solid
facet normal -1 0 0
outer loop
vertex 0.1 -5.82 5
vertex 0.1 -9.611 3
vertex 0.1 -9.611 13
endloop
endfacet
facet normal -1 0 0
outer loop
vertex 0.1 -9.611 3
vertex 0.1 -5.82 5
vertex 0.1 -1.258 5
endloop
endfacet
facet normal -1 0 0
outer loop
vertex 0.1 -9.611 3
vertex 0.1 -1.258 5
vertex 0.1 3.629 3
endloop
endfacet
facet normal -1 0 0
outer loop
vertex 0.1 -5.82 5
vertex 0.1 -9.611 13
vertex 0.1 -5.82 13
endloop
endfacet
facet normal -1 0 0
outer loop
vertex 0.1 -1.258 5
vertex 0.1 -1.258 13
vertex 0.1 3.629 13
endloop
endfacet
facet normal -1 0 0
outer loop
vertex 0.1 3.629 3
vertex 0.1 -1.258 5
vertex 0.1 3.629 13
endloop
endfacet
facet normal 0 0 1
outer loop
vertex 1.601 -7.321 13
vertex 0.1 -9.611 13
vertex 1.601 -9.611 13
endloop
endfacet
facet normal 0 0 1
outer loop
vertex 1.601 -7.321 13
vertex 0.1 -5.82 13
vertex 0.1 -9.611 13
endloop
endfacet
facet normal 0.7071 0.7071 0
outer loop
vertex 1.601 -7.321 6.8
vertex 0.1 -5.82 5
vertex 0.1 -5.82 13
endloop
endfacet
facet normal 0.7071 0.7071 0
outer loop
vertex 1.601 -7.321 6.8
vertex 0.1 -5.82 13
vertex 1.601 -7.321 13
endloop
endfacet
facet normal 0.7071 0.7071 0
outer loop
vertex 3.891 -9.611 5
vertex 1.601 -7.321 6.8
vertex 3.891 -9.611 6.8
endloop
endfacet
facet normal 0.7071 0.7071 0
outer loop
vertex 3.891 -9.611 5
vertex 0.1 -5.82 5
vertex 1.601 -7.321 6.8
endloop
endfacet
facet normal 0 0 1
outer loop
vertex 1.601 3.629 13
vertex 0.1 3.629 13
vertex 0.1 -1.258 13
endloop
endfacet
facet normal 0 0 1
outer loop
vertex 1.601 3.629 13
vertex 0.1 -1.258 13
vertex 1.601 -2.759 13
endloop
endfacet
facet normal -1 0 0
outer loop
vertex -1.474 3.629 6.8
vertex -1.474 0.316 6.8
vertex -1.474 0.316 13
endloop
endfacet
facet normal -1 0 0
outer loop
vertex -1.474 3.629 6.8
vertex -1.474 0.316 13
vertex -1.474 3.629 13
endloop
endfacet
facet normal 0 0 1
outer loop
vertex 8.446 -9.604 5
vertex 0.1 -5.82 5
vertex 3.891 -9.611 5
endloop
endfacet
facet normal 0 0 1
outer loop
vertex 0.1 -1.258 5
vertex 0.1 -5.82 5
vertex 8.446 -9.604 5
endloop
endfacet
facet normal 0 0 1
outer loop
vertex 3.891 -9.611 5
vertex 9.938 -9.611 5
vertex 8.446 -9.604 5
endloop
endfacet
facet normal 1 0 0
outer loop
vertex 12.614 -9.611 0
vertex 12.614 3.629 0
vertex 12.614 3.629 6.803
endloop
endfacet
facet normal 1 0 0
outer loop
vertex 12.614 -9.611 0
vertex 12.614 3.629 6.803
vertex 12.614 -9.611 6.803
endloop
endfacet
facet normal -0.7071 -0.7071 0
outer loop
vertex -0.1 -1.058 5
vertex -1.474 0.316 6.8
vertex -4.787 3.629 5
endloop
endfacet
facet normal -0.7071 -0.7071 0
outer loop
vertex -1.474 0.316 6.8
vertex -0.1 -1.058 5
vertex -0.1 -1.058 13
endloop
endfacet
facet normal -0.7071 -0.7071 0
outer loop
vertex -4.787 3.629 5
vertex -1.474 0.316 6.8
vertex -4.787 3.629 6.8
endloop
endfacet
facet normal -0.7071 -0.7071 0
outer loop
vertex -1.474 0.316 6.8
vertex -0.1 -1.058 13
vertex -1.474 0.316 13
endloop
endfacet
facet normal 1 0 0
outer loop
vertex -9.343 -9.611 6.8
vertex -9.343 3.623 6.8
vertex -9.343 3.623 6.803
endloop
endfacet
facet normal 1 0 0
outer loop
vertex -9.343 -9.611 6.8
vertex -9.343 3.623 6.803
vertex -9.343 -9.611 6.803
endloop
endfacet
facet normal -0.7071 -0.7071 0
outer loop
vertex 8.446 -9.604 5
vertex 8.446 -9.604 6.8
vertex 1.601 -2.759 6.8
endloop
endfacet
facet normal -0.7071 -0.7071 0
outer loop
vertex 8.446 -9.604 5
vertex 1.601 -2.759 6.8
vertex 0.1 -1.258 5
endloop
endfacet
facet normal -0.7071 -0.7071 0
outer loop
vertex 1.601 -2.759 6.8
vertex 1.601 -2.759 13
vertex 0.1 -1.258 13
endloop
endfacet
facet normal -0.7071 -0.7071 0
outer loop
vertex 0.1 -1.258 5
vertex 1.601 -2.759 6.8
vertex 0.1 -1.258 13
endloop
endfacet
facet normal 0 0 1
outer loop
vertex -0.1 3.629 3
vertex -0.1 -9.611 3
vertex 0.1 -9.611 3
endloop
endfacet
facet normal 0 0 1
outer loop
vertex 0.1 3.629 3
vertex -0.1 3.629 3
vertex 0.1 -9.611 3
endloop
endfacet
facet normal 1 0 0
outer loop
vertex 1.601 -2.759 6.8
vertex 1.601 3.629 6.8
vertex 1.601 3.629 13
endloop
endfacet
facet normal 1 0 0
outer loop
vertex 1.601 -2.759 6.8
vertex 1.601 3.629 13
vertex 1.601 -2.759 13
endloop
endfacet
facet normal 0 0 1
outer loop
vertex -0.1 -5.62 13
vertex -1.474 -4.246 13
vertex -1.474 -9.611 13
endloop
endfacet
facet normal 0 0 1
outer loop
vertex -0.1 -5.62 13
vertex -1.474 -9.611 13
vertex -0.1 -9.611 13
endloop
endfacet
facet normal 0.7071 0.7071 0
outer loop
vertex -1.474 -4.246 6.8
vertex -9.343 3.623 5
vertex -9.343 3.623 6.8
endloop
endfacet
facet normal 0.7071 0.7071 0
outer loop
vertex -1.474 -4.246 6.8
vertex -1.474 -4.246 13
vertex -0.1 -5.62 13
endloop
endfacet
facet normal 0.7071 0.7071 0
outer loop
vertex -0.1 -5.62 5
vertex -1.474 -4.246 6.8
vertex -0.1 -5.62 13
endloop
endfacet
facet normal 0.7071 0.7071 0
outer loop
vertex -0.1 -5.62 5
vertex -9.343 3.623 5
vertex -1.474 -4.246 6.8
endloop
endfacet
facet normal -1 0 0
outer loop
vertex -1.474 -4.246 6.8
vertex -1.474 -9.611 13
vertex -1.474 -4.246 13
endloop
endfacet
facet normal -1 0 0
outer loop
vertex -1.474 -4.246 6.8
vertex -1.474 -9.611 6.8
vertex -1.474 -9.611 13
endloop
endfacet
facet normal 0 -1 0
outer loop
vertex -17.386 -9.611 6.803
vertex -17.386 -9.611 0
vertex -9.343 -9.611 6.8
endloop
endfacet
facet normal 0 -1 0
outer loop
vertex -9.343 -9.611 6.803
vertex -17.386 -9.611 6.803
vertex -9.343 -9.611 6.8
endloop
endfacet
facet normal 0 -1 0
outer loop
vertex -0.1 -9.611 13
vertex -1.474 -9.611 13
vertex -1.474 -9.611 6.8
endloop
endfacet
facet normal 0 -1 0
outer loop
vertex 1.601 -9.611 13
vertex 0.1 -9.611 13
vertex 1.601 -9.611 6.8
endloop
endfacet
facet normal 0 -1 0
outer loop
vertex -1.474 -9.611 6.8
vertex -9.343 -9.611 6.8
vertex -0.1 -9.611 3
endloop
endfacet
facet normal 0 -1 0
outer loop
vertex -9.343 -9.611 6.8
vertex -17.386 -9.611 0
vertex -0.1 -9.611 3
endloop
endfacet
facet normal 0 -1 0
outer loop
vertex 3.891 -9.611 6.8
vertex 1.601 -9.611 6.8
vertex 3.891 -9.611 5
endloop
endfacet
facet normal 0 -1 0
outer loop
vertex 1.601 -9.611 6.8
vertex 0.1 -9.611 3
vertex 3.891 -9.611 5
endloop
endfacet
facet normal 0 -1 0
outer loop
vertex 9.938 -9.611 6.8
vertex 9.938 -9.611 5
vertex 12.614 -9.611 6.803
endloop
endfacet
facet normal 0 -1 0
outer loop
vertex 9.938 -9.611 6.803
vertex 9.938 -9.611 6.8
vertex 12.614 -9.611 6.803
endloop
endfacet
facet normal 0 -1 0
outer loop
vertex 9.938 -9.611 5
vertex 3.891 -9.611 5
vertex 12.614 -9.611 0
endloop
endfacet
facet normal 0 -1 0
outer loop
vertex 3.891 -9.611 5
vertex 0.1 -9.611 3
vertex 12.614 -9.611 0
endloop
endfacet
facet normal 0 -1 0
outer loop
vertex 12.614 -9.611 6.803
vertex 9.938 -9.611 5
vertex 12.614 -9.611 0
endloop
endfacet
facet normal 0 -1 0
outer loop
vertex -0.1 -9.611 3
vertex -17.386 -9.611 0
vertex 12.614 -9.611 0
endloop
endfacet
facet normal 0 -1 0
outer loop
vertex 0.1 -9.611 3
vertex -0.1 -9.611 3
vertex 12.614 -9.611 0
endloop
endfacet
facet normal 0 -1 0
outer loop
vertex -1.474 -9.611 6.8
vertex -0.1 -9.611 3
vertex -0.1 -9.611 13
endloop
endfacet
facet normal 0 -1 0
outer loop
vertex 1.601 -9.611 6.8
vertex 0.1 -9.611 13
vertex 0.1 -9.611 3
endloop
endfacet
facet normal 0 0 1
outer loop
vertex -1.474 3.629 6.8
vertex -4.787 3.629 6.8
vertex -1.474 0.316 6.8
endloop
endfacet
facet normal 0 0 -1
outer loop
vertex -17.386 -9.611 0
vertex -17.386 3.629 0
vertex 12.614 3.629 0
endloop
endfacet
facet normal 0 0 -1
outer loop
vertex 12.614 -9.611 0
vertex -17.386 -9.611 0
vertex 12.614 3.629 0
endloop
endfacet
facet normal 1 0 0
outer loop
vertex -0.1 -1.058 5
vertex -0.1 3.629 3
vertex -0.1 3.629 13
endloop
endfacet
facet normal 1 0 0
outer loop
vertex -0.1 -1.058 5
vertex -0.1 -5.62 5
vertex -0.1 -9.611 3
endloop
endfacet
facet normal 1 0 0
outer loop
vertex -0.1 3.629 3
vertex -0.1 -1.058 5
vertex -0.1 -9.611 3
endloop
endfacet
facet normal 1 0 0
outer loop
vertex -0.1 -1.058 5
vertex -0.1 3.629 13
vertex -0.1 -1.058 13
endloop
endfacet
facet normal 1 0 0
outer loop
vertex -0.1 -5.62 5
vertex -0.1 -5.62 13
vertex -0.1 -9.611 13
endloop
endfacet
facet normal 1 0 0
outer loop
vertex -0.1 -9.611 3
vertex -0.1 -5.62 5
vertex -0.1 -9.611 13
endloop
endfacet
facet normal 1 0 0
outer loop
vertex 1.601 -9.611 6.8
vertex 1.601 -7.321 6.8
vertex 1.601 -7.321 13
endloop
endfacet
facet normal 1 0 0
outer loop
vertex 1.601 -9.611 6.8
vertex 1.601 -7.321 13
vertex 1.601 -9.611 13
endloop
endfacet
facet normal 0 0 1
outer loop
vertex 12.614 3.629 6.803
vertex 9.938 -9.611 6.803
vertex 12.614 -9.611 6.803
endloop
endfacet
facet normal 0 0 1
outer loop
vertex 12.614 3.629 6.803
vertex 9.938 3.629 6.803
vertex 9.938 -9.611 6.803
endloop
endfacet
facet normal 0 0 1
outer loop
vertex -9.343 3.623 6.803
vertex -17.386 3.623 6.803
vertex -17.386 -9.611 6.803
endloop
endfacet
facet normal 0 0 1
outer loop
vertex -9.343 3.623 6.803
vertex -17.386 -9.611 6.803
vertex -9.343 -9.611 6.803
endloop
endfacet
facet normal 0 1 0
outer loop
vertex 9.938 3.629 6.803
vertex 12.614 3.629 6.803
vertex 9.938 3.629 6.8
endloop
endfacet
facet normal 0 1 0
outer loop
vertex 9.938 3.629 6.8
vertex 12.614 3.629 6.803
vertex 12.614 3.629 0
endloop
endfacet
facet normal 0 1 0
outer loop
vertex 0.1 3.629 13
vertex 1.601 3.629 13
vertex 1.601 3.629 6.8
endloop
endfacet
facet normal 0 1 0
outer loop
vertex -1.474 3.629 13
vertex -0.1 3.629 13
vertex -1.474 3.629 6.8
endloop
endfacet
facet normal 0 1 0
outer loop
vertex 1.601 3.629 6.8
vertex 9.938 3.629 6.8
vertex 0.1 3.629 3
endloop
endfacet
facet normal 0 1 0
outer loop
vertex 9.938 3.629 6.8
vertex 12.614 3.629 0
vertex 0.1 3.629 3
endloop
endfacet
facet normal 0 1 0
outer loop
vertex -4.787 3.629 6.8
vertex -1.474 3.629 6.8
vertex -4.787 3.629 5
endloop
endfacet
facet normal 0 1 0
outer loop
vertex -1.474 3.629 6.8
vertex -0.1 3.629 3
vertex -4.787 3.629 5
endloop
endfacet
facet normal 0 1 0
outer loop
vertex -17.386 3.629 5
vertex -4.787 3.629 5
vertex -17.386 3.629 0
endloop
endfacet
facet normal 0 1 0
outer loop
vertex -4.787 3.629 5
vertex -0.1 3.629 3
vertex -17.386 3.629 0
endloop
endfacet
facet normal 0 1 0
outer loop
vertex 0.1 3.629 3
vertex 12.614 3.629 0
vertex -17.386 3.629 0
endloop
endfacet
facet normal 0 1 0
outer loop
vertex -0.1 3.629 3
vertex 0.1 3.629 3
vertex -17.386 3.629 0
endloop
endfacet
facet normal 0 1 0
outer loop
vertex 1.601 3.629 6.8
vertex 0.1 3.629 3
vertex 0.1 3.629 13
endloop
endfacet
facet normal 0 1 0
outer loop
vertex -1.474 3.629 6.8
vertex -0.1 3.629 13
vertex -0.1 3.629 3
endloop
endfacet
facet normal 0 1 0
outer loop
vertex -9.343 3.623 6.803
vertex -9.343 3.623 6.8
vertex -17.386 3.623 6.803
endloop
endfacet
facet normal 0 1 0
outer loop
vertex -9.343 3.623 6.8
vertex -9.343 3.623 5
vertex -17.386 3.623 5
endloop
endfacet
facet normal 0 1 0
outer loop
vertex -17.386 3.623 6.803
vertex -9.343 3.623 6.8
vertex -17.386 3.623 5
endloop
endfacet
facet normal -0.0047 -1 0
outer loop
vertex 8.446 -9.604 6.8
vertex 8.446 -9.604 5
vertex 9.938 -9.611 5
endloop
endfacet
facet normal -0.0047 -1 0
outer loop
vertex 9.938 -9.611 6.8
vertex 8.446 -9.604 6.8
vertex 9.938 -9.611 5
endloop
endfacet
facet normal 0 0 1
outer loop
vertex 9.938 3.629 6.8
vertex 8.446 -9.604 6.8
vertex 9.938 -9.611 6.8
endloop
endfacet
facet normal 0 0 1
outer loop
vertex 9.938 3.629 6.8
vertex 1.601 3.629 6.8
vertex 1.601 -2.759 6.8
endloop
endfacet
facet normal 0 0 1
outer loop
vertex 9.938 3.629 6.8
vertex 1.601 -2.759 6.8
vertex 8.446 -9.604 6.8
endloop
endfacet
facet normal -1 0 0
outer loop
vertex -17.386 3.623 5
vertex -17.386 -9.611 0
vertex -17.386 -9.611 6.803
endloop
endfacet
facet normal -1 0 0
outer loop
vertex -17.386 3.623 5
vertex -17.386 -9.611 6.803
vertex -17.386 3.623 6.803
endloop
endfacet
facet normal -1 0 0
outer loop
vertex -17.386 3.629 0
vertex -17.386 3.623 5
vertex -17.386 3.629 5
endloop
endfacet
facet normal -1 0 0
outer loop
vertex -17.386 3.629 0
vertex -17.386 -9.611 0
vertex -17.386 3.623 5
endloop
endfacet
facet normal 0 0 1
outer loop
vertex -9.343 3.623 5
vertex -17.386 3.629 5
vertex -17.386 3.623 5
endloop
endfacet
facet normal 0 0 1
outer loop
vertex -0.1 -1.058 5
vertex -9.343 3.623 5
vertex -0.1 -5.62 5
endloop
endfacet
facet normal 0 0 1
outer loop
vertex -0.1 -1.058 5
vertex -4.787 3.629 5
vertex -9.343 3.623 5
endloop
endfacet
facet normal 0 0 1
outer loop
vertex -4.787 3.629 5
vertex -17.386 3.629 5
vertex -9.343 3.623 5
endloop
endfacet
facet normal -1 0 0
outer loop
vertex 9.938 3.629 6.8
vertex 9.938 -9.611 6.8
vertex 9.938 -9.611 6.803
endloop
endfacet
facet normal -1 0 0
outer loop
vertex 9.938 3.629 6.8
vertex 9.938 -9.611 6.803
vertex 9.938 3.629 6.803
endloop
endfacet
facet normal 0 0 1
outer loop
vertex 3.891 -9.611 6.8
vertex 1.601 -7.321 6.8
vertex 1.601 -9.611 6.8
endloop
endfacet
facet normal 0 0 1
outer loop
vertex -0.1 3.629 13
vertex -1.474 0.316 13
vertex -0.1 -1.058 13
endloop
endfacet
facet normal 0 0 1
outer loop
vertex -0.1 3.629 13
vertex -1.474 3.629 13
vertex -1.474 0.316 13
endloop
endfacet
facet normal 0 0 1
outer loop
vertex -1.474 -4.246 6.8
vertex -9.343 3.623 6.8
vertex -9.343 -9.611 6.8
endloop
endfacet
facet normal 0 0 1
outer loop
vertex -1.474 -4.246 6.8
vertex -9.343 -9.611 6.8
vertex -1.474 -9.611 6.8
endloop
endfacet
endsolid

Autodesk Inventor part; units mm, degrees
ref_plane "YZ Plane" through (0, 0, 0) normal (1, 0, 0) x (0, 1, 0)
ref_plane "XZ Plane" through (0, 0, 0) normal (0, 1, 0) x (-1, 0, 0)
ref_plane "XY Plane" through (0, 0, 0) normal (0, 0, 1) x (1, 0, 0)
sketch "Sketch1" plane through (0, 0, 0) normal (0, 0, 1) x (1, 0, 0)
  line L0 (-17.386, 3.6293) -> (12.614, 3.6293)
  line L1 (12.614, 3.6293) -> (12.614, -9.6107)
  line L2 (12.614, -9.6107) -> (-17.386, -9.6107)
  line L3 (-17.386, -9.6107) -> (-17.386, 3.6293)
  point P0 (0, 0)
  dimension "d0" = 30
  dimension "d1" = 13.24
extrude "Extrusion1" add sketch "Sketch1" along normal blind 5
sketch "Sketch5" plane through (0, 0, 5) normal (0, 0, 1) x (1, 0, 0)
  line L0 (-9.3427, 3.6227) -> (3.8907, -9.6107)
  line L1 (-4.7873, 3.6293) -> (8.4461, -9.6041)
  line L2 (-4.7873, 3.6293) -> (13.9275, 3.6293) construction
  line L3 (-9.3427, 3.6227) -> (-9.3427, -9.6107)
  line L4 (-9.3427, -9.6107) -> (3.8907, -9.6107)
  line L5 (3.8907, -9.6107) -> (3.8907, -9.6107)
  line L6 (-4.7873, 3.6293) -> (9.938, 3.6293)
  line L7 (12.614, 3.6293) -> (-17.386, 3.6293) projected
  line L8 (9.938, 3.6293) -> (9.938, -9.6107)
  line L9 (-17.386, -9.6107) -> (12.614, -9.6107) projected
  line L10 (8.4461, -9.6041) -> (9.938, -9.6107)
  line L11 (-9.3427, 3.6227) -> (-9.3427, -9.6107)
  line L12 (3.8907, -9.6107) -> (-9.3427, -9.6107)
  line L13 (3.8907, -9.6107) -> (-9.3427, 3.6227)
  line L14 (-4.7873, 3.6293) -> (8.4461, -9.6041)
  line L15 (8.4461, -9.6041) -> (9.938, -9.6107)
  line L16 (9.938, 3.6293) -> (9.938, -9.6107)
  line L17 (9.938, 3.6293) -> (-4.7873, 3.6293)
  point P0 (0, 0)
  dimension "d15" = 45
  dimension "d16" = 3.2258
  dimension "d17" = 13.2334
  dimension "d18" = 18.7148
  dimension "d19" = 18.7148
extrude "Extrusion5" add sketch "Sketch5" along normal blind 1.8
sketch "Sketch6" plane through (0, 0, 6.8) normal (0, 0, 1) x (1, 0, 0)
  line L0 (9.938, 3.6293) -> (-4.7873, 3.6293) projected
  line L1 (12.614, -9.6107) -> (-17.386, -9.6107) projected
  line L2 (-1.4744, 3.6293) -> (1.6007, 3.6293)
  line L3 (1.6007, 3.6293) -> (1.6007, -9.6107)
  line L4 (1.6007, -9.6107) -> (-1.4744, -9.6107)
  line L5 (-1.4744, -9.6107) -> (-1.4744, 3.6293)
  point P0 (0, 0)
extrude "Extrusion6" add sketch "Sketch6" along normal blind 6.2
sketch "Sketch9" plane through (0, 0, 13) normal (0, 0, 1) x (1, 0, 0)
  line L0 (-1.4744, -4.2456) -> (-9.3427, 3.6227) projected
  line L1 (-9.3427, 3.6227) -> (3.8907, -9.6107) projected
  line L2 (-1.4744, -4.2456) -> (3.8907, -9.6107)
  line L3 (3.8907, -9.6107) -> (3.8907, -5.0487)
  line L4 (8.4461, -9.6041) -> (-4.7873, 3.6293) projected
  line L5 (3.8907, -5.0487) -> (-2.9105, 1.7525)
  line L6 (-2.9105, 1.7525) -> (-2.9105, -2.8095)
  line L7 (-1.4744, -4.2456) -> (-2.9105, -2.8095)
  point P0 (0, 0)
extrude "Extrusion7" cut sketch "Sketch9" against normal blind 6.3
sketch "Sketch10" plane through (0, 0, 13) normal (0, 0, 1) x (1, 0, 0)
  line L0 (12.614, -9.6107) -> (-17.386, -9.6107) projected
  line L1 (1.6007, 3.6293) -> (-1.4744, 3.6293) projected
  line L2 (-0.1, -9.6107) -> (0.1, -9.6107)
  line L3 (0.1, -9.6107) -> (0.1, 3.6293)
  line L4 (0.1, 3.6293) -> (-0.1, 3.6293)
  line L5 (-0.1, 3.6293) -> (-0.1, -9.6107)
  line L6 (0, -6.9346) -> (0, -6.5072) construction
  point P0 (0, 0)
  dimension "d26" = 0.2
extrude "Extrusion8" cut sketch "Sketch10" against normal blind 10
sketch "Sketch11" plane through (0, 0, 5) normal (0, 0, 1) x (1, 0, 0)
  line L0 (9.938, 3.6293) -> (1.6007, 3.6293) projected
  line L1 (9.938, -9.6107) -> (12.614, -9.6107) projected
  line L2 (9.938, 3.6293) -> (12.614, 3.6293)
  line L3 (12.614, 3.6293) -> (12.614, -9.6107)
  line L4 (12.614, -9.6107) -> (9.938, -9.6107)
  line L5 (9.938, -9.6107) -> (9.938, 3.6293)
  line L6 (-17.386, -9.6107) -> (-9.3427, -9.6107) projected
  line L7 (-9.3427, 3.6227) -> (-9.3427, -9.6107) projected
  line L8 (-17.386, -9.6107) -> (-9.3427, -9.6107)
  line L9 (-9.3427, -9.6107) -> (-9.3427, 3.6227)
  line L10 (-9.3427, 3.6227) -> (-17.386, 3.6227)
  line L11 (-17.386, 3.6227) -> (-17.386, -9.6107)
  point P0 (0, 0)
extrude "Extrusion9" add sketch "Sketch11" along normal blind 1.8034
properties part number "BalsaBoi2"
